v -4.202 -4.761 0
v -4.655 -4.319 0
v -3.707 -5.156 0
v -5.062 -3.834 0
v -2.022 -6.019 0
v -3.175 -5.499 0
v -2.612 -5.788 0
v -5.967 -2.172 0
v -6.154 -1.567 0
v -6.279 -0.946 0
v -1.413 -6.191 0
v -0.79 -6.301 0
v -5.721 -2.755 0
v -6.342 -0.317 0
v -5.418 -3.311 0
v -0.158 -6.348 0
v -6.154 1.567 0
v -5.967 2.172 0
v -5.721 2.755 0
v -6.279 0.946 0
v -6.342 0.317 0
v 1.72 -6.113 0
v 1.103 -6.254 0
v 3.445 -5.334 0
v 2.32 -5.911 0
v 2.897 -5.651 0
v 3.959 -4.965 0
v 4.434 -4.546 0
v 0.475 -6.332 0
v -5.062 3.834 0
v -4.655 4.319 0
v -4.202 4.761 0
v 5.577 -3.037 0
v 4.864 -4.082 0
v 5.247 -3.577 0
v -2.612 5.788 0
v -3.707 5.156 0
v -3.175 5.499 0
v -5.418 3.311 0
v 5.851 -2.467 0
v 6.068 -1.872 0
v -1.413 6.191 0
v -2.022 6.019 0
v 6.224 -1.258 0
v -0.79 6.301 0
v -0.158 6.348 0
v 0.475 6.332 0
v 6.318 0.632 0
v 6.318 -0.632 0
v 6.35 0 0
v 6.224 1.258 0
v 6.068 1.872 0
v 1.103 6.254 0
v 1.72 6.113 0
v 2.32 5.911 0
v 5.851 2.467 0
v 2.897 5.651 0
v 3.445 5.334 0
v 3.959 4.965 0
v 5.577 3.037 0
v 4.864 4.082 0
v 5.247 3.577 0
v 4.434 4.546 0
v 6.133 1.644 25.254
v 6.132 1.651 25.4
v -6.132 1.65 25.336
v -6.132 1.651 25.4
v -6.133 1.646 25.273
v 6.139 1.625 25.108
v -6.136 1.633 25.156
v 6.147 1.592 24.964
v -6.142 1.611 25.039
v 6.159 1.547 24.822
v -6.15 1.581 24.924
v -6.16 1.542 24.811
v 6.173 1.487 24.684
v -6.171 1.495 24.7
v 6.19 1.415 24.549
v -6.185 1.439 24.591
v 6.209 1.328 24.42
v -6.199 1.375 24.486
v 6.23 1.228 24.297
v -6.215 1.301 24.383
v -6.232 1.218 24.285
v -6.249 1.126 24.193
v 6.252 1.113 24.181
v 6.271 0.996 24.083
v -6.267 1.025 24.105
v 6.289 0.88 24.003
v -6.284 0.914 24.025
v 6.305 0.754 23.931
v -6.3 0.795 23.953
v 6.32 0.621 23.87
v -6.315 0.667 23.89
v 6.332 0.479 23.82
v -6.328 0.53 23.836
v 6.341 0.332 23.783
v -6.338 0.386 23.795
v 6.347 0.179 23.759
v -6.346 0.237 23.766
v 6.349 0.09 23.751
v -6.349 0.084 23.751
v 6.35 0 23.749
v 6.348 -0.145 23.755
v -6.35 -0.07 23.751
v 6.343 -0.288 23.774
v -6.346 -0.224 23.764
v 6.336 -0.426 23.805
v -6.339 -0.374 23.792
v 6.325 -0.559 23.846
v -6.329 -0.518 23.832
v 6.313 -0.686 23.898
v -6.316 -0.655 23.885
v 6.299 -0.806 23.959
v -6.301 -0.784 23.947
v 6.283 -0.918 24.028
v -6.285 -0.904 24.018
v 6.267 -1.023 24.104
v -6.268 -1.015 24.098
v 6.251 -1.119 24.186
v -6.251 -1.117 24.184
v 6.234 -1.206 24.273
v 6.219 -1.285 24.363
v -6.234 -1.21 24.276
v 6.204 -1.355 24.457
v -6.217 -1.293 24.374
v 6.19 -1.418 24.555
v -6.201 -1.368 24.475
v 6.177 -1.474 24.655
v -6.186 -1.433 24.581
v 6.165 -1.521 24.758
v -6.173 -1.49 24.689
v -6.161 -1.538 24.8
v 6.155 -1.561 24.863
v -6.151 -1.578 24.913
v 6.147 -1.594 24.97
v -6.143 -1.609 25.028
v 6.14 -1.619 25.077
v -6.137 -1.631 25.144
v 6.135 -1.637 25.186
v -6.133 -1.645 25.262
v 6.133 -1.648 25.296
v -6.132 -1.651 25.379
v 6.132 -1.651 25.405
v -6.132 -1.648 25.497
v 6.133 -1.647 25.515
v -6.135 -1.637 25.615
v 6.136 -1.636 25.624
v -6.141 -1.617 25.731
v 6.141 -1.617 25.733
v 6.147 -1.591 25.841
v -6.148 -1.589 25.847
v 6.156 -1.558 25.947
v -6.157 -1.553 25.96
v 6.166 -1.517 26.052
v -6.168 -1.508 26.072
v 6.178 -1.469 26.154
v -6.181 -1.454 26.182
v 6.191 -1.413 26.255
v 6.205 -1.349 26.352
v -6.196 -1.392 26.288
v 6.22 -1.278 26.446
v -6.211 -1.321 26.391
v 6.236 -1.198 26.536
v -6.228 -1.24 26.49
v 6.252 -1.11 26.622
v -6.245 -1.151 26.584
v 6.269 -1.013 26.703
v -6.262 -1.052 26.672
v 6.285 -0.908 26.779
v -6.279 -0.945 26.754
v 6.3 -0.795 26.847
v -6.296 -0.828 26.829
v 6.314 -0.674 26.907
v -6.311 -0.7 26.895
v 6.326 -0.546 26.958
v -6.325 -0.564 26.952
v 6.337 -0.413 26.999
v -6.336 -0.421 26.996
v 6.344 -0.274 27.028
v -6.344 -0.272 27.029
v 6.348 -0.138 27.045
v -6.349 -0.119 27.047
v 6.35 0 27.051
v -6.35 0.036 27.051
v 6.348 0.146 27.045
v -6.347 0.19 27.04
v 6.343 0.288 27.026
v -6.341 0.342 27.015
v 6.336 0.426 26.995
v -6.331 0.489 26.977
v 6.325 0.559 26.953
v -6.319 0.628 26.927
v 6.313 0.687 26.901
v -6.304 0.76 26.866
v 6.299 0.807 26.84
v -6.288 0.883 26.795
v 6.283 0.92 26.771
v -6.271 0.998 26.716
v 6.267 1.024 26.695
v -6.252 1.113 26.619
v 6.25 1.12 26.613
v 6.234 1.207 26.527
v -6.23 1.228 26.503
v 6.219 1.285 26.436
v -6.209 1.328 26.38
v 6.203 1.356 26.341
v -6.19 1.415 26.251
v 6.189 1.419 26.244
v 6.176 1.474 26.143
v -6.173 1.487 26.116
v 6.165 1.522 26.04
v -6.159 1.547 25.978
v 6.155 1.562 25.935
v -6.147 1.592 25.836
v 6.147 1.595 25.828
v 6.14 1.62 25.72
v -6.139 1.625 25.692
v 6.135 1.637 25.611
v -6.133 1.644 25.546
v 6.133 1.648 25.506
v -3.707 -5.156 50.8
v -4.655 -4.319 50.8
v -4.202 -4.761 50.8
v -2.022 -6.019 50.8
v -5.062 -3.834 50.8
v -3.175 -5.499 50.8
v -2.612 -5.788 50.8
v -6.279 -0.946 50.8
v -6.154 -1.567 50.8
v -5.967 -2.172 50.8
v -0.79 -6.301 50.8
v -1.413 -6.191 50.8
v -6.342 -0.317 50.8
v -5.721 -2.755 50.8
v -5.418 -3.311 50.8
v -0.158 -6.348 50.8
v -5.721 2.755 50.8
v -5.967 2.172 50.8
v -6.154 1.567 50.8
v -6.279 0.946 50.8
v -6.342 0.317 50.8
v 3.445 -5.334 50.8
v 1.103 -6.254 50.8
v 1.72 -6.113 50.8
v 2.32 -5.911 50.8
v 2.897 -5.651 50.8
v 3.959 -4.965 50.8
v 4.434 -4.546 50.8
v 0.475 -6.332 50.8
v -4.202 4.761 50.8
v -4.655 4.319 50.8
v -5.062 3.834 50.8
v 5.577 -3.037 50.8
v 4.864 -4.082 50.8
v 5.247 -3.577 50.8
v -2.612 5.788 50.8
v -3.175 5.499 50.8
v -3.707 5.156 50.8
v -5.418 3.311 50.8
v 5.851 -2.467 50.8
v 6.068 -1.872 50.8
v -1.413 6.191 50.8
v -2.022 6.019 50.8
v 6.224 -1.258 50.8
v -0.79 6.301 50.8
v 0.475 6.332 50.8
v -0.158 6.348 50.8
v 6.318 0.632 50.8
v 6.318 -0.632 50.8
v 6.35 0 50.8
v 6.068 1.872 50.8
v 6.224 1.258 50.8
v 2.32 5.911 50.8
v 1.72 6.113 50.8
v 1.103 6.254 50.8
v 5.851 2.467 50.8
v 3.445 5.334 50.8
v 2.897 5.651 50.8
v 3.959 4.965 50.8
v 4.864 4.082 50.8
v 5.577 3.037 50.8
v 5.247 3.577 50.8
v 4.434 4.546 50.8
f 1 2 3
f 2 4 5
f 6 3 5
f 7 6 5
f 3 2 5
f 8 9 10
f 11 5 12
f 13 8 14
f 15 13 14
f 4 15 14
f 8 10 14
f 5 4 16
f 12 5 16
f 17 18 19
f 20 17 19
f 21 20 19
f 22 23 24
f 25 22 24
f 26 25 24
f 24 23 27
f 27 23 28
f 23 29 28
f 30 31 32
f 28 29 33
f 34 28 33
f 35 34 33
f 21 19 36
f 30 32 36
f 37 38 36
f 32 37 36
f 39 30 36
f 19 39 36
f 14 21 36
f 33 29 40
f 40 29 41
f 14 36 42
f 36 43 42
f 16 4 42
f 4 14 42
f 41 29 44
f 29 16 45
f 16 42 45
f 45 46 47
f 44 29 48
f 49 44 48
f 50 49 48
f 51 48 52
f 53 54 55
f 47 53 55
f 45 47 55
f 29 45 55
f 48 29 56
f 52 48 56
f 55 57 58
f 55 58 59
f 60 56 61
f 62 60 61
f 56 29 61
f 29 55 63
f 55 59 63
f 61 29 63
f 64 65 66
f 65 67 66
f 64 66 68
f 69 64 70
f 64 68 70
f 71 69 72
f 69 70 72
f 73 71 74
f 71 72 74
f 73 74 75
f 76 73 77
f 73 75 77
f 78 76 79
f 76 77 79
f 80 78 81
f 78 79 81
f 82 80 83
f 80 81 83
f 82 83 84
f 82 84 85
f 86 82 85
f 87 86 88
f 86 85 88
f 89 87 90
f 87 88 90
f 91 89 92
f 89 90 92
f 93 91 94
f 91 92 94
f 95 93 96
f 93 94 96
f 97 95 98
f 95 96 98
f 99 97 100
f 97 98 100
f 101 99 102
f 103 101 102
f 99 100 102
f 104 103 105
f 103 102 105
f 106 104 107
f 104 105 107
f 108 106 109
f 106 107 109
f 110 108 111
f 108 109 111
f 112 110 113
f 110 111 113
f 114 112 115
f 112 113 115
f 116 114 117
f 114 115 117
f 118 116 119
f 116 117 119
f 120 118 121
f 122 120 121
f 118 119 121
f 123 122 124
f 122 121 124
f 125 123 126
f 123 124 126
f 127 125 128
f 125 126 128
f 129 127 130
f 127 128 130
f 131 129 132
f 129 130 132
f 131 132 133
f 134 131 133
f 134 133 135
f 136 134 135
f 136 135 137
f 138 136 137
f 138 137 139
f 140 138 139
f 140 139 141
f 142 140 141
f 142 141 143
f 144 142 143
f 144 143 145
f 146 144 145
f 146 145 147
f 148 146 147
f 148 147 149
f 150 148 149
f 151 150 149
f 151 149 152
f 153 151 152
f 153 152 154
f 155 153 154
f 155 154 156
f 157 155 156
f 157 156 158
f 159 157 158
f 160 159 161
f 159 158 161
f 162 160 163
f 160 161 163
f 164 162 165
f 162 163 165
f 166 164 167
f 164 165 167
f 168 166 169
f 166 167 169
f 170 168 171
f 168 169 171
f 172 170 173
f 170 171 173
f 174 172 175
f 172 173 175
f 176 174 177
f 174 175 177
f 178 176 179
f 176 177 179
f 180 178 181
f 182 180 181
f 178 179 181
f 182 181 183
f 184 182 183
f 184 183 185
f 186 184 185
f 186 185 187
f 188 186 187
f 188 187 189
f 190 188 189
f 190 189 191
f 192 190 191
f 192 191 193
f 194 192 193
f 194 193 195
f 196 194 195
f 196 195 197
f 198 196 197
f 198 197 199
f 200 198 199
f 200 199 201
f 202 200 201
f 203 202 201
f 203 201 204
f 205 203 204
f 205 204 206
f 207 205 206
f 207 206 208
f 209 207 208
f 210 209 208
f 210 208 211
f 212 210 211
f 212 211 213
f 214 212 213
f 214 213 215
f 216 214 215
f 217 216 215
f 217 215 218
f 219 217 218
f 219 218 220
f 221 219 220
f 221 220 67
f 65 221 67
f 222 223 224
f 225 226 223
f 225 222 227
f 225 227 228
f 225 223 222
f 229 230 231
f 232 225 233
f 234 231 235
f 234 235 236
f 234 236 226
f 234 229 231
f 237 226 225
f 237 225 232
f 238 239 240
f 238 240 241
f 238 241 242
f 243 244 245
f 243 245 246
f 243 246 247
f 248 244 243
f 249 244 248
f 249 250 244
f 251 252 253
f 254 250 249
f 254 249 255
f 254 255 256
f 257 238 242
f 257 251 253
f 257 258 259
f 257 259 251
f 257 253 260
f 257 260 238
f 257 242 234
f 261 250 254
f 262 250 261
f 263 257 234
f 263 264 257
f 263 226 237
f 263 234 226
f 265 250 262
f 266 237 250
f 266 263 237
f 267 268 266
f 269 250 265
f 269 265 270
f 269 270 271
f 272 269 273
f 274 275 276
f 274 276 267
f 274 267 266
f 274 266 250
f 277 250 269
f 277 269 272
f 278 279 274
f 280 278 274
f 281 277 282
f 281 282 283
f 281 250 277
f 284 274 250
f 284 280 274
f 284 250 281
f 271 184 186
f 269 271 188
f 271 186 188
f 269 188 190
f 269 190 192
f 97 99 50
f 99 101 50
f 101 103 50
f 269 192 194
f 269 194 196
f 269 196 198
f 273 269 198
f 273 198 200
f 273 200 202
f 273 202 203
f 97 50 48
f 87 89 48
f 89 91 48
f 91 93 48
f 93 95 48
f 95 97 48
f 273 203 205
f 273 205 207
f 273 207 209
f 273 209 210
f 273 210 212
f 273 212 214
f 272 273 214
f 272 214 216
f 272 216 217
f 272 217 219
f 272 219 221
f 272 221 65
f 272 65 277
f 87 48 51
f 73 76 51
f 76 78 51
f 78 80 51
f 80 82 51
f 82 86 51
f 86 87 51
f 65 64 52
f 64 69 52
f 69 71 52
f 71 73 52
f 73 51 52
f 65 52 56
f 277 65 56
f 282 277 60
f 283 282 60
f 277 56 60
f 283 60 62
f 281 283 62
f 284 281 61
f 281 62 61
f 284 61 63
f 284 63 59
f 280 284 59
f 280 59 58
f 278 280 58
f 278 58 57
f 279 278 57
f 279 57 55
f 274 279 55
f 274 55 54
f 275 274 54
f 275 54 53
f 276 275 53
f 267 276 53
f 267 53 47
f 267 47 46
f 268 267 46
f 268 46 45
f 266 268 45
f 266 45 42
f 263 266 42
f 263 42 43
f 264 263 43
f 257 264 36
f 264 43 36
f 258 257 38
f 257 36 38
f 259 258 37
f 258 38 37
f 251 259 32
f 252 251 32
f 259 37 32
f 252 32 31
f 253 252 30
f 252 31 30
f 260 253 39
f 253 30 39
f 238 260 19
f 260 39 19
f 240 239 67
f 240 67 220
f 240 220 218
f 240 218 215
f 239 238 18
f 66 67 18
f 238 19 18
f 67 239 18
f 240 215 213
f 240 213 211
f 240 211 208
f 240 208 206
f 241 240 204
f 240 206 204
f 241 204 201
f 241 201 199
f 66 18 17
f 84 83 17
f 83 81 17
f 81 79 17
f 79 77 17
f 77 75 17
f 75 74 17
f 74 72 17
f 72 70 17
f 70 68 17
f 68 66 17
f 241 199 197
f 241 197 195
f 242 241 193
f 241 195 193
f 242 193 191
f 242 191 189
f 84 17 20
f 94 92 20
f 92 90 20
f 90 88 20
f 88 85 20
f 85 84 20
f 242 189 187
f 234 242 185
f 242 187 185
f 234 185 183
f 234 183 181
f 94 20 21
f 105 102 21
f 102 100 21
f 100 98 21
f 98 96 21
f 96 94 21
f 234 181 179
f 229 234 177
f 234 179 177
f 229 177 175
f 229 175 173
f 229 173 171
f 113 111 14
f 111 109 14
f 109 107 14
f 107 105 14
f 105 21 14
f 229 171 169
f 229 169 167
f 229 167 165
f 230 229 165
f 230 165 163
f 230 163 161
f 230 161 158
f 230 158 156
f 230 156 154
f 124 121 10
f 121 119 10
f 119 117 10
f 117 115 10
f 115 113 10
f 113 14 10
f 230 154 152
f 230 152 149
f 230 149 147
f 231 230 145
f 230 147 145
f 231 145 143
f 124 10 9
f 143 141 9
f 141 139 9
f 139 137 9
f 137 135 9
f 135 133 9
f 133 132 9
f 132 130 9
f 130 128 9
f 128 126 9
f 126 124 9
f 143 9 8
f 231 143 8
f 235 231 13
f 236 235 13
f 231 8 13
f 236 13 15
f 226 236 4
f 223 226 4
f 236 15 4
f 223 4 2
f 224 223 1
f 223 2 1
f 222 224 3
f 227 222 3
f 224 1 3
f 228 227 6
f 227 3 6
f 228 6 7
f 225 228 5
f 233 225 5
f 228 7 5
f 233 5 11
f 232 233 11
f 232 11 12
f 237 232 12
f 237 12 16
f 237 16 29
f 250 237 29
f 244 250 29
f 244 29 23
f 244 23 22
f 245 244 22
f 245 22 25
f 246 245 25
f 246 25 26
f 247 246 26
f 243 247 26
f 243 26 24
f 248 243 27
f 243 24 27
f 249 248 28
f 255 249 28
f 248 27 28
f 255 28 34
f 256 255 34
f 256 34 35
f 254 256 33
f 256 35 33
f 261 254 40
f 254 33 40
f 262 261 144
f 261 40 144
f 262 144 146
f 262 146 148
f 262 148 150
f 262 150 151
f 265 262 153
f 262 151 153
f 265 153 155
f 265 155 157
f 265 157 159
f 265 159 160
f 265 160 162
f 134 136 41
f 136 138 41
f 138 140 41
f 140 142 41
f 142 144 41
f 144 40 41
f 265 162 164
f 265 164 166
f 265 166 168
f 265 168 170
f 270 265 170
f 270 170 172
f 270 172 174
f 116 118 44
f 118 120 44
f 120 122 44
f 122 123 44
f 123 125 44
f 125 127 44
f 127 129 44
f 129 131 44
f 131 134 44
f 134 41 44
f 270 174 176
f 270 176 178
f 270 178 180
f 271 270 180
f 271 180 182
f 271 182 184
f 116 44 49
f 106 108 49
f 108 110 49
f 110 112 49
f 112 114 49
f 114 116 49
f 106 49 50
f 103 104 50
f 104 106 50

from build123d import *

# Parameters (mm, degrees)
F0_R      = 6.35
F1_DEPTH  = 50.8
F2_R      = 1.651
F3_DEPTH  = 6.351
F3_FACE_R = 1.651
F4_DEPTH  = 25.4


with BuildPart() as f1:
    # F0 (on Top) → F1 (new body)
    with BuildSketch(Plane.XY):
        Circle(F0_R)
    extrude(amount=F1_DEPTH)

    # F2 (on Right) → F3 (cut, through all)
    with BuildSketch(Plane.YZ):
        with Locations((0, 25.4)):
            Circle(F2_R)
    extrude(amount=-F3_DEPTH, mode=Mode.SUBTRACT)

    # F3_face (on face) → F4 (cut)
    with BuildSketch(Plane(origin=(0, 0, 25.4), x_dir=(0, 1, 0), z_dir=(-1, 0, 0))):
        Circle(F3_FACE_R)
    extrude(amount=-F4_DEPTH, mode=Mode.SUBTRACT)


solid = f1.part
